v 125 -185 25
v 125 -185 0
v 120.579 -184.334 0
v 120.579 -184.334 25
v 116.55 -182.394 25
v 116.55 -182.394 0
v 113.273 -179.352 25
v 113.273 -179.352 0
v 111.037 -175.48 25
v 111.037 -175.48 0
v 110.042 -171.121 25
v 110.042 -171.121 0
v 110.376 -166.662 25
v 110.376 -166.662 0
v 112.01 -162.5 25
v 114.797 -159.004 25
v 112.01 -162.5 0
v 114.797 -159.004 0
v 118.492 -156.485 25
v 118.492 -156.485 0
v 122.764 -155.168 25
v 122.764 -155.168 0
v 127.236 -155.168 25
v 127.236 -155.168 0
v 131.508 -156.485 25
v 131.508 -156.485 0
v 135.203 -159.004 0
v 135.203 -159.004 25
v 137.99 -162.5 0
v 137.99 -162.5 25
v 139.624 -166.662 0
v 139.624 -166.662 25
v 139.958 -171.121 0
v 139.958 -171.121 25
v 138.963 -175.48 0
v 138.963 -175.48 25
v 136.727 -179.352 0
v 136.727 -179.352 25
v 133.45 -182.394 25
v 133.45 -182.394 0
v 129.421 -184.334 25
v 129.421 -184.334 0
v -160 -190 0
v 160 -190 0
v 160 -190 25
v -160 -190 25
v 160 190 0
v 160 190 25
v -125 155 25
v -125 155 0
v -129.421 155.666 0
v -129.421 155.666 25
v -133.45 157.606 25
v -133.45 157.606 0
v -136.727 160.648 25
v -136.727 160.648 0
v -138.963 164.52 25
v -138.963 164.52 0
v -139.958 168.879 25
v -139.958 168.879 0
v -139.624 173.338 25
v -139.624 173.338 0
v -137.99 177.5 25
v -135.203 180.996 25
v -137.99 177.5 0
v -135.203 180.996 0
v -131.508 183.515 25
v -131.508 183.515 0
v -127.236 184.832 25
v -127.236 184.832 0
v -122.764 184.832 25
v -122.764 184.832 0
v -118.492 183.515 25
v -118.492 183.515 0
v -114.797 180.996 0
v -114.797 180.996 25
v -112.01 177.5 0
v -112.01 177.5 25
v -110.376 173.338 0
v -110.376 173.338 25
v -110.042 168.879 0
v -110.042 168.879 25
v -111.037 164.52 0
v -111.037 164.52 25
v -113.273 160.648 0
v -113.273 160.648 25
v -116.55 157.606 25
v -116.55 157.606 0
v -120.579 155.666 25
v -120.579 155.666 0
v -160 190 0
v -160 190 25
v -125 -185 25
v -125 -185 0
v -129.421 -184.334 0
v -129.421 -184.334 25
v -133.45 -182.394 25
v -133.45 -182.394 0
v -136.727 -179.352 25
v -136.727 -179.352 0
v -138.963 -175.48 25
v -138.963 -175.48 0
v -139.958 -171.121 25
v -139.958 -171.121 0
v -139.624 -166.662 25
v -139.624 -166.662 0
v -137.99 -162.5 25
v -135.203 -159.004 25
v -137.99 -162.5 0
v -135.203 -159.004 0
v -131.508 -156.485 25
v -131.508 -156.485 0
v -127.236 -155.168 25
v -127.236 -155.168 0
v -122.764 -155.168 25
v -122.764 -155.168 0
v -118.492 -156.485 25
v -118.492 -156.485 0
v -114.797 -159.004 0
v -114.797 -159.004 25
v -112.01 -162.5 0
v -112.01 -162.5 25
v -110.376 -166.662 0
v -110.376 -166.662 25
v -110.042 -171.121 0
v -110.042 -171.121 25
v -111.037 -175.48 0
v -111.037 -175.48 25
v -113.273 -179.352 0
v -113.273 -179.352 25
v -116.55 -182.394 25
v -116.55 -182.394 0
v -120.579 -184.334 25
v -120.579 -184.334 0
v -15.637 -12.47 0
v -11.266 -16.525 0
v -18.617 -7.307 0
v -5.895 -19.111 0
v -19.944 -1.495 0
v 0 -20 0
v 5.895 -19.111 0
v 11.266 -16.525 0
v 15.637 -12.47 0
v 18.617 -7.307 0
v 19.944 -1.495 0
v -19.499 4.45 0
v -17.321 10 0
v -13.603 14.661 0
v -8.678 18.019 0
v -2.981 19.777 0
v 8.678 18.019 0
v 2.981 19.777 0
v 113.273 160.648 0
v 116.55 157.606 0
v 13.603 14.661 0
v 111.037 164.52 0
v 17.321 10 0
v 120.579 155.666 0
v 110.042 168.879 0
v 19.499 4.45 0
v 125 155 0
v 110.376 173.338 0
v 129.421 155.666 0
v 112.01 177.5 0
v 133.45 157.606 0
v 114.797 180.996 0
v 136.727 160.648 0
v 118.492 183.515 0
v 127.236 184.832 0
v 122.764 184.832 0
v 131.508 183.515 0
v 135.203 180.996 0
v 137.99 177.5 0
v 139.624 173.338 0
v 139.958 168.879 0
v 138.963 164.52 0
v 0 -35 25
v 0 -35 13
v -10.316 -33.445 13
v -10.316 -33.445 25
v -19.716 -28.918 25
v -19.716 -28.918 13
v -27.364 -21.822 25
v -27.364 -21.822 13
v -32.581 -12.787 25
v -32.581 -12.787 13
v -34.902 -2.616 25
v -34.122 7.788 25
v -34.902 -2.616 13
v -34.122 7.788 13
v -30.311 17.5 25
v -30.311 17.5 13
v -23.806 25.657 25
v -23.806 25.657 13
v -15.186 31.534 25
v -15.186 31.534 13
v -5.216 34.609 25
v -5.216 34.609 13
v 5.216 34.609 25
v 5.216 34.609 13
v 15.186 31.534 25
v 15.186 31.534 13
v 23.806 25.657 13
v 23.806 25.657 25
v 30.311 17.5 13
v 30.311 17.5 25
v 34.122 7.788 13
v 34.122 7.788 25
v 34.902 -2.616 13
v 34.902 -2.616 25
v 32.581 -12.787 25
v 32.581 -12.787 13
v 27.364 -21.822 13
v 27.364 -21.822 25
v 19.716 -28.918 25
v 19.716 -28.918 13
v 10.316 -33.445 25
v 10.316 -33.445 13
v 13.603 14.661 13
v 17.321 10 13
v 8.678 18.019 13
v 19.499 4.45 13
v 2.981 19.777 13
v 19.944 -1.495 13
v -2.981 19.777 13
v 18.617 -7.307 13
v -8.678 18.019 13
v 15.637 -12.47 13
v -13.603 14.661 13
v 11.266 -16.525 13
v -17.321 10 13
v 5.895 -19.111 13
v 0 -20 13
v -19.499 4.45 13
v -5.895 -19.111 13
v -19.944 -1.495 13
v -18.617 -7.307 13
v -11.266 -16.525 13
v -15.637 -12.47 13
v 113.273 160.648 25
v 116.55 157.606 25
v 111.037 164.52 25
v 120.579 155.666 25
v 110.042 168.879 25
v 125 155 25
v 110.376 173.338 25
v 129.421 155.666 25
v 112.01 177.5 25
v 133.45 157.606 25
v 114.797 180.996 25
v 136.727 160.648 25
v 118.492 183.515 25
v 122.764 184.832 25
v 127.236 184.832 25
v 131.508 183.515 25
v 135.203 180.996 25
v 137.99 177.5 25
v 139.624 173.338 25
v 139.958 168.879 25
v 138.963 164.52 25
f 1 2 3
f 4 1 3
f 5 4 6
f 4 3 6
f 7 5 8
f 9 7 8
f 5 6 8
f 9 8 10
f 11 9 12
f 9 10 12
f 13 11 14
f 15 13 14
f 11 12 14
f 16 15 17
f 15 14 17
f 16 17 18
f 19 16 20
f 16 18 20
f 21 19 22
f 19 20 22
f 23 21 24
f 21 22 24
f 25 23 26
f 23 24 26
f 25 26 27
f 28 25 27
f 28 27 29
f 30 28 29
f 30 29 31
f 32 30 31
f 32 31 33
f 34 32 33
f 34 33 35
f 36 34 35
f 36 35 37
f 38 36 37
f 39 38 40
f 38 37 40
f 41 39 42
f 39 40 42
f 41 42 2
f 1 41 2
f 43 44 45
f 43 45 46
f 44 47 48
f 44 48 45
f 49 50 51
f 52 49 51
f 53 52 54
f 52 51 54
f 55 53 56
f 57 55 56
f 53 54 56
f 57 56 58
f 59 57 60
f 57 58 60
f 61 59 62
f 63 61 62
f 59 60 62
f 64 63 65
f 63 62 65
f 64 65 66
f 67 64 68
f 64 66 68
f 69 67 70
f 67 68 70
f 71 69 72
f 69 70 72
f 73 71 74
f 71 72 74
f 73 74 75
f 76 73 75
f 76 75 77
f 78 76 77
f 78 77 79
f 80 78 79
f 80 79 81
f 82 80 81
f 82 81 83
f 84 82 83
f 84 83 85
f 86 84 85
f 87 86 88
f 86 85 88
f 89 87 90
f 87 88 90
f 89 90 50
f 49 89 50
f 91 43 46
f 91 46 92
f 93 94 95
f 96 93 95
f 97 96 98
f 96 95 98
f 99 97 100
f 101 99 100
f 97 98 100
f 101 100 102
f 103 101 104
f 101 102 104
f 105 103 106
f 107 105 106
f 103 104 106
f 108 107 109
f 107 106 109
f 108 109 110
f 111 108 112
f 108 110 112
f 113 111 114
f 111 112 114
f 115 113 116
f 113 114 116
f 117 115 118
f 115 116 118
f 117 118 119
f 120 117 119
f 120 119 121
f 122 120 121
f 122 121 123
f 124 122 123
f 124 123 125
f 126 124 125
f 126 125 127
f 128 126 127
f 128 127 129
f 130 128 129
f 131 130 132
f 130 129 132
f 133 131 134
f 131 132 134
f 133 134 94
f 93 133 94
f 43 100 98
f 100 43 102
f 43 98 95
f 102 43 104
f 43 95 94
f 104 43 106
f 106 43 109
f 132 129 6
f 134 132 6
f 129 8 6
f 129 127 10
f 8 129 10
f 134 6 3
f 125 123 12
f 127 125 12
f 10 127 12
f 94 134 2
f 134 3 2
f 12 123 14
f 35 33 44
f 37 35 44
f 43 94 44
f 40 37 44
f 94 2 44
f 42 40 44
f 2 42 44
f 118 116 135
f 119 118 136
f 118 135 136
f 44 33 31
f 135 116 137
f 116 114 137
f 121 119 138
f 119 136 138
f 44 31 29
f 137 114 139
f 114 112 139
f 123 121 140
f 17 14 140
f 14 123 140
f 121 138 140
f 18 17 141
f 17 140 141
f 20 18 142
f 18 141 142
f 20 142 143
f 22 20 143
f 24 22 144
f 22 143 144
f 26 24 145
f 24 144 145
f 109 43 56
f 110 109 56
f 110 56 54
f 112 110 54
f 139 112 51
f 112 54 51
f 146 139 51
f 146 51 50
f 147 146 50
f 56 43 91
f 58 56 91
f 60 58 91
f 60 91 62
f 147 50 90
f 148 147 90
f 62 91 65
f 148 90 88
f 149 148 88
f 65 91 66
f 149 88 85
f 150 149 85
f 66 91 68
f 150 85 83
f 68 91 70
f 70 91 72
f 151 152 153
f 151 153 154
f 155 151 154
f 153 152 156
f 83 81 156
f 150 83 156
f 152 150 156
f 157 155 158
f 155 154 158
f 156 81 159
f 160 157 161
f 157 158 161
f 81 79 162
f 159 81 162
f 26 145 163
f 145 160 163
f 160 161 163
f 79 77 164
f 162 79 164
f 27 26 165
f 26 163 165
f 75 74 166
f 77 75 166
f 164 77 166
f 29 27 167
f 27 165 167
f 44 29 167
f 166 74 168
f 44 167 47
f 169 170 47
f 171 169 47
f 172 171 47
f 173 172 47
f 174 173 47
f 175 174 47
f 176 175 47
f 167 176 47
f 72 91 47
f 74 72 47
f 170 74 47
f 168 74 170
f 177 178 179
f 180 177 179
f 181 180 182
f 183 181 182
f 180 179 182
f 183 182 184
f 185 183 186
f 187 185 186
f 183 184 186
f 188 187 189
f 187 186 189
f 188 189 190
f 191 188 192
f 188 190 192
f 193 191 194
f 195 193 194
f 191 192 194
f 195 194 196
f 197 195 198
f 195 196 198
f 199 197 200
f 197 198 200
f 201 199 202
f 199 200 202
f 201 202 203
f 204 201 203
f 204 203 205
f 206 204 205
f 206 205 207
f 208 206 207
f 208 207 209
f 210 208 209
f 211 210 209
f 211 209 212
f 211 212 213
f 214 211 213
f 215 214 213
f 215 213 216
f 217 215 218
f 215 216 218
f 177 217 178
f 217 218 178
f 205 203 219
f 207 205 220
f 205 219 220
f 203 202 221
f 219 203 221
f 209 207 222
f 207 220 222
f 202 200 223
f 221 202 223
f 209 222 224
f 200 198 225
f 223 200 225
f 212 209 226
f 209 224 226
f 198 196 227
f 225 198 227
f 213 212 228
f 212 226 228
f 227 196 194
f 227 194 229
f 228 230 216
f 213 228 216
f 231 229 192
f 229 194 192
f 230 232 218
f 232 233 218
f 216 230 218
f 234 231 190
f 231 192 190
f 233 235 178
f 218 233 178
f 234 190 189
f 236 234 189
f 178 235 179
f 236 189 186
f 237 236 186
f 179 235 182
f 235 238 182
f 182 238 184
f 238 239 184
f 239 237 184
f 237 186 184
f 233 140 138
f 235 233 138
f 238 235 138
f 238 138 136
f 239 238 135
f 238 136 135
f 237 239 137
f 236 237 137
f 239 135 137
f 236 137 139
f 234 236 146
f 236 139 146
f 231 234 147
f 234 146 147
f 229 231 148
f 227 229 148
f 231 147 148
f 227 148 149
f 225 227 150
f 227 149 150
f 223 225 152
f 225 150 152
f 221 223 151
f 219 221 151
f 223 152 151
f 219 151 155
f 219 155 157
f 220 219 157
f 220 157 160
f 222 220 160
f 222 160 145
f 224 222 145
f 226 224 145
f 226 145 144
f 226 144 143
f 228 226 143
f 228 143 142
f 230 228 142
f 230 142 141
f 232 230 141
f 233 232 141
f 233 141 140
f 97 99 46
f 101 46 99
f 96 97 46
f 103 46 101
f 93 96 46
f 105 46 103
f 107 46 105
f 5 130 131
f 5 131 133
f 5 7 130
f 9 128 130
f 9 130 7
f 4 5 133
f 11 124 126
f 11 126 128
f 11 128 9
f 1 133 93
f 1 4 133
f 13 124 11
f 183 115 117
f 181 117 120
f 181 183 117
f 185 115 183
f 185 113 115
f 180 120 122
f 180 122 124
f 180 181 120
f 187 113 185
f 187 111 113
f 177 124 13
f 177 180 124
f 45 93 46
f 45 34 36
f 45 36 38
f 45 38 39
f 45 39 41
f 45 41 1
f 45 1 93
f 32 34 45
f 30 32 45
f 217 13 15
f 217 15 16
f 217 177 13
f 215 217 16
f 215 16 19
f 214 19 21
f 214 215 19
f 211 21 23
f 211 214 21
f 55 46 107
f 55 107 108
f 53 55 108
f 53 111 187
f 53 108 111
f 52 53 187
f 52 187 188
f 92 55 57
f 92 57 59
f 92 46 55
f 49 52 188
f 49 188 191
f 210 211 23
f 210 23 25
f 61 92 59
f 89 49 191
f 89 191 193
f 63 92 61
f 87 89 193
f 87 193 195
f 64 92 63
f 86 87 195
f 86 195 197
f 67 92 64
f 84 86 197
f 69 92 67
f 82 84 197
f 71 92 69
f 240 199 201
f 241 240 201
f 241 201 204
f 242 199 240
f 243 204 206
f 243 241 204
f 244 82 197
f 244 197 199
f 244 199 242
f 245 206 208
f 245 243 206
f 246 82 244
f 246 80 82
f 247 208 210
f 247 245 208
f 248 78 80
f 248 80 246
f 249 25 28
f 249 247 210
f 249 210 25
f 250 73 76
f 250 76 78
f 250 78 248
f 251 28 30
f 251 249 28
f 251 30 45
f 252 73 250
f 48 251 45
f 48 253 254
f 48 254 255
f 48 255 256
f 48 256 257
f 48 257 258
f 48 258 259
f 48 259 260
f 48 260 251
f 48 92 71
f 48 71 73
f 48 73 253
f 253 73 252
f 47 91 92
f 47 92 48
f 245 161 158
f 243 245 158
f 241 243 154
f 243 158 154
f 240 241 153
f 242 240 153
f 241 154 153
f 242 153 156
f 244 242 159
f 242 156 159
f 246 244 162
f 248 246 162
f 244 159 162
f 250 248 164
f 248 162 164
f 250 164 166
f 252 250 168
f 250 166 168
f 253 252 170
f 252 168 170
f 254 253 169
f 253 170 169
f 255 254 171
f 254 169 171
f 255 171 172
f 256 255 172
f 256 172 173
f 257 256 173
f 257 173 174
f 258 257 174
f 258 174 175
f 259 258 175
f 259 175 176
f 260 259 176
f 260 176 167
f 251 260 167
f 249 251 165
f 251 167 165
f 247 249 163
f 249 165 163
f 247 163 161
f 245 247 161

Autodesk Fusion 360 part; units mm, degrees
sketch "Sketch1" plane through (0, 0, 0) normal (0, 0, 1) x (1, 0, 0)
  line L0 (160, -190) -> (-160, -190)
  line L1 (-160, -190) -> (-160, 190)
  line L2 (-160, 190) -> (160, 190)
  line L3 (160, 190) -> (160, -190)
  line L4 (160, -190) -> (-160, 190) construction
  line L5 (-160, -190) -> (160, 190) construction
  dimension "d1" = 320
  dimension "d2" = 380
extrude "Extrude1" add sketch "Sketch1" along normal blind 25
sketch "Sketch2" plane through (0, 0, 25) normal (0, 0, 1) x (1, 0, 0)
  line L0 (160, 190) -> (-160, 190)
  line L1 (-160, 190) -> (-160, -190)
  line L2 (-160, -190) -> (160, -190)
  line L3 (160, -190) -> (160, 190)
  line L4 (-160, 190) -> (-125, 190)
  line L5 (-125, 190) -> (-125, 170)
  line L6 (-125, 170) -> (-160, 170)
  line L7 (-160, 170) -> (-160, 190)
  line L8 (160, 190) -> (125, 190)
  line L9 (125, 190) -> (125, 170)
  line L10 (125, 170) -> (160, 170)
  line L11 (160, 170) -> (160, 190)
  line L12 (160, -190) -> (125, -190)
  line L13 (125, -190) -> (125, -170)
  line L14 (125, -170) -> (160, -170)
  line L15 (160, -170) -> (160, -190)
  line L16 (-160, -190) -> (-125, -190)
  line L17 (-125, -190) -> (-125, -170)
  line L18 (-125, -170) -> (-160, -170)
  line L19 (-160, -170) -> (-160, -190)
  dimension "d5" = 35
  dimension "d6" = 20
  dimension "d7" = 35
  dimension "d8" = 20
  dimension "d9" = 20
  dimension "d10" = 35
  dimension "d11" = 35
  dimension "d12" = 20
hole "Hole1" at (-125, 170, 25) at (125, 170, 25) at (125, -170, 25) at (-125, -170, 25) direction (0, 0, -1) diameter 30 depth 25 tip angle 118
hole "Hole2" at (0, 0, 25) direction (0, 0, -1) diameter 40 depth 50 tip angle 118 counterbore diameter 70 counterbore depth 12
